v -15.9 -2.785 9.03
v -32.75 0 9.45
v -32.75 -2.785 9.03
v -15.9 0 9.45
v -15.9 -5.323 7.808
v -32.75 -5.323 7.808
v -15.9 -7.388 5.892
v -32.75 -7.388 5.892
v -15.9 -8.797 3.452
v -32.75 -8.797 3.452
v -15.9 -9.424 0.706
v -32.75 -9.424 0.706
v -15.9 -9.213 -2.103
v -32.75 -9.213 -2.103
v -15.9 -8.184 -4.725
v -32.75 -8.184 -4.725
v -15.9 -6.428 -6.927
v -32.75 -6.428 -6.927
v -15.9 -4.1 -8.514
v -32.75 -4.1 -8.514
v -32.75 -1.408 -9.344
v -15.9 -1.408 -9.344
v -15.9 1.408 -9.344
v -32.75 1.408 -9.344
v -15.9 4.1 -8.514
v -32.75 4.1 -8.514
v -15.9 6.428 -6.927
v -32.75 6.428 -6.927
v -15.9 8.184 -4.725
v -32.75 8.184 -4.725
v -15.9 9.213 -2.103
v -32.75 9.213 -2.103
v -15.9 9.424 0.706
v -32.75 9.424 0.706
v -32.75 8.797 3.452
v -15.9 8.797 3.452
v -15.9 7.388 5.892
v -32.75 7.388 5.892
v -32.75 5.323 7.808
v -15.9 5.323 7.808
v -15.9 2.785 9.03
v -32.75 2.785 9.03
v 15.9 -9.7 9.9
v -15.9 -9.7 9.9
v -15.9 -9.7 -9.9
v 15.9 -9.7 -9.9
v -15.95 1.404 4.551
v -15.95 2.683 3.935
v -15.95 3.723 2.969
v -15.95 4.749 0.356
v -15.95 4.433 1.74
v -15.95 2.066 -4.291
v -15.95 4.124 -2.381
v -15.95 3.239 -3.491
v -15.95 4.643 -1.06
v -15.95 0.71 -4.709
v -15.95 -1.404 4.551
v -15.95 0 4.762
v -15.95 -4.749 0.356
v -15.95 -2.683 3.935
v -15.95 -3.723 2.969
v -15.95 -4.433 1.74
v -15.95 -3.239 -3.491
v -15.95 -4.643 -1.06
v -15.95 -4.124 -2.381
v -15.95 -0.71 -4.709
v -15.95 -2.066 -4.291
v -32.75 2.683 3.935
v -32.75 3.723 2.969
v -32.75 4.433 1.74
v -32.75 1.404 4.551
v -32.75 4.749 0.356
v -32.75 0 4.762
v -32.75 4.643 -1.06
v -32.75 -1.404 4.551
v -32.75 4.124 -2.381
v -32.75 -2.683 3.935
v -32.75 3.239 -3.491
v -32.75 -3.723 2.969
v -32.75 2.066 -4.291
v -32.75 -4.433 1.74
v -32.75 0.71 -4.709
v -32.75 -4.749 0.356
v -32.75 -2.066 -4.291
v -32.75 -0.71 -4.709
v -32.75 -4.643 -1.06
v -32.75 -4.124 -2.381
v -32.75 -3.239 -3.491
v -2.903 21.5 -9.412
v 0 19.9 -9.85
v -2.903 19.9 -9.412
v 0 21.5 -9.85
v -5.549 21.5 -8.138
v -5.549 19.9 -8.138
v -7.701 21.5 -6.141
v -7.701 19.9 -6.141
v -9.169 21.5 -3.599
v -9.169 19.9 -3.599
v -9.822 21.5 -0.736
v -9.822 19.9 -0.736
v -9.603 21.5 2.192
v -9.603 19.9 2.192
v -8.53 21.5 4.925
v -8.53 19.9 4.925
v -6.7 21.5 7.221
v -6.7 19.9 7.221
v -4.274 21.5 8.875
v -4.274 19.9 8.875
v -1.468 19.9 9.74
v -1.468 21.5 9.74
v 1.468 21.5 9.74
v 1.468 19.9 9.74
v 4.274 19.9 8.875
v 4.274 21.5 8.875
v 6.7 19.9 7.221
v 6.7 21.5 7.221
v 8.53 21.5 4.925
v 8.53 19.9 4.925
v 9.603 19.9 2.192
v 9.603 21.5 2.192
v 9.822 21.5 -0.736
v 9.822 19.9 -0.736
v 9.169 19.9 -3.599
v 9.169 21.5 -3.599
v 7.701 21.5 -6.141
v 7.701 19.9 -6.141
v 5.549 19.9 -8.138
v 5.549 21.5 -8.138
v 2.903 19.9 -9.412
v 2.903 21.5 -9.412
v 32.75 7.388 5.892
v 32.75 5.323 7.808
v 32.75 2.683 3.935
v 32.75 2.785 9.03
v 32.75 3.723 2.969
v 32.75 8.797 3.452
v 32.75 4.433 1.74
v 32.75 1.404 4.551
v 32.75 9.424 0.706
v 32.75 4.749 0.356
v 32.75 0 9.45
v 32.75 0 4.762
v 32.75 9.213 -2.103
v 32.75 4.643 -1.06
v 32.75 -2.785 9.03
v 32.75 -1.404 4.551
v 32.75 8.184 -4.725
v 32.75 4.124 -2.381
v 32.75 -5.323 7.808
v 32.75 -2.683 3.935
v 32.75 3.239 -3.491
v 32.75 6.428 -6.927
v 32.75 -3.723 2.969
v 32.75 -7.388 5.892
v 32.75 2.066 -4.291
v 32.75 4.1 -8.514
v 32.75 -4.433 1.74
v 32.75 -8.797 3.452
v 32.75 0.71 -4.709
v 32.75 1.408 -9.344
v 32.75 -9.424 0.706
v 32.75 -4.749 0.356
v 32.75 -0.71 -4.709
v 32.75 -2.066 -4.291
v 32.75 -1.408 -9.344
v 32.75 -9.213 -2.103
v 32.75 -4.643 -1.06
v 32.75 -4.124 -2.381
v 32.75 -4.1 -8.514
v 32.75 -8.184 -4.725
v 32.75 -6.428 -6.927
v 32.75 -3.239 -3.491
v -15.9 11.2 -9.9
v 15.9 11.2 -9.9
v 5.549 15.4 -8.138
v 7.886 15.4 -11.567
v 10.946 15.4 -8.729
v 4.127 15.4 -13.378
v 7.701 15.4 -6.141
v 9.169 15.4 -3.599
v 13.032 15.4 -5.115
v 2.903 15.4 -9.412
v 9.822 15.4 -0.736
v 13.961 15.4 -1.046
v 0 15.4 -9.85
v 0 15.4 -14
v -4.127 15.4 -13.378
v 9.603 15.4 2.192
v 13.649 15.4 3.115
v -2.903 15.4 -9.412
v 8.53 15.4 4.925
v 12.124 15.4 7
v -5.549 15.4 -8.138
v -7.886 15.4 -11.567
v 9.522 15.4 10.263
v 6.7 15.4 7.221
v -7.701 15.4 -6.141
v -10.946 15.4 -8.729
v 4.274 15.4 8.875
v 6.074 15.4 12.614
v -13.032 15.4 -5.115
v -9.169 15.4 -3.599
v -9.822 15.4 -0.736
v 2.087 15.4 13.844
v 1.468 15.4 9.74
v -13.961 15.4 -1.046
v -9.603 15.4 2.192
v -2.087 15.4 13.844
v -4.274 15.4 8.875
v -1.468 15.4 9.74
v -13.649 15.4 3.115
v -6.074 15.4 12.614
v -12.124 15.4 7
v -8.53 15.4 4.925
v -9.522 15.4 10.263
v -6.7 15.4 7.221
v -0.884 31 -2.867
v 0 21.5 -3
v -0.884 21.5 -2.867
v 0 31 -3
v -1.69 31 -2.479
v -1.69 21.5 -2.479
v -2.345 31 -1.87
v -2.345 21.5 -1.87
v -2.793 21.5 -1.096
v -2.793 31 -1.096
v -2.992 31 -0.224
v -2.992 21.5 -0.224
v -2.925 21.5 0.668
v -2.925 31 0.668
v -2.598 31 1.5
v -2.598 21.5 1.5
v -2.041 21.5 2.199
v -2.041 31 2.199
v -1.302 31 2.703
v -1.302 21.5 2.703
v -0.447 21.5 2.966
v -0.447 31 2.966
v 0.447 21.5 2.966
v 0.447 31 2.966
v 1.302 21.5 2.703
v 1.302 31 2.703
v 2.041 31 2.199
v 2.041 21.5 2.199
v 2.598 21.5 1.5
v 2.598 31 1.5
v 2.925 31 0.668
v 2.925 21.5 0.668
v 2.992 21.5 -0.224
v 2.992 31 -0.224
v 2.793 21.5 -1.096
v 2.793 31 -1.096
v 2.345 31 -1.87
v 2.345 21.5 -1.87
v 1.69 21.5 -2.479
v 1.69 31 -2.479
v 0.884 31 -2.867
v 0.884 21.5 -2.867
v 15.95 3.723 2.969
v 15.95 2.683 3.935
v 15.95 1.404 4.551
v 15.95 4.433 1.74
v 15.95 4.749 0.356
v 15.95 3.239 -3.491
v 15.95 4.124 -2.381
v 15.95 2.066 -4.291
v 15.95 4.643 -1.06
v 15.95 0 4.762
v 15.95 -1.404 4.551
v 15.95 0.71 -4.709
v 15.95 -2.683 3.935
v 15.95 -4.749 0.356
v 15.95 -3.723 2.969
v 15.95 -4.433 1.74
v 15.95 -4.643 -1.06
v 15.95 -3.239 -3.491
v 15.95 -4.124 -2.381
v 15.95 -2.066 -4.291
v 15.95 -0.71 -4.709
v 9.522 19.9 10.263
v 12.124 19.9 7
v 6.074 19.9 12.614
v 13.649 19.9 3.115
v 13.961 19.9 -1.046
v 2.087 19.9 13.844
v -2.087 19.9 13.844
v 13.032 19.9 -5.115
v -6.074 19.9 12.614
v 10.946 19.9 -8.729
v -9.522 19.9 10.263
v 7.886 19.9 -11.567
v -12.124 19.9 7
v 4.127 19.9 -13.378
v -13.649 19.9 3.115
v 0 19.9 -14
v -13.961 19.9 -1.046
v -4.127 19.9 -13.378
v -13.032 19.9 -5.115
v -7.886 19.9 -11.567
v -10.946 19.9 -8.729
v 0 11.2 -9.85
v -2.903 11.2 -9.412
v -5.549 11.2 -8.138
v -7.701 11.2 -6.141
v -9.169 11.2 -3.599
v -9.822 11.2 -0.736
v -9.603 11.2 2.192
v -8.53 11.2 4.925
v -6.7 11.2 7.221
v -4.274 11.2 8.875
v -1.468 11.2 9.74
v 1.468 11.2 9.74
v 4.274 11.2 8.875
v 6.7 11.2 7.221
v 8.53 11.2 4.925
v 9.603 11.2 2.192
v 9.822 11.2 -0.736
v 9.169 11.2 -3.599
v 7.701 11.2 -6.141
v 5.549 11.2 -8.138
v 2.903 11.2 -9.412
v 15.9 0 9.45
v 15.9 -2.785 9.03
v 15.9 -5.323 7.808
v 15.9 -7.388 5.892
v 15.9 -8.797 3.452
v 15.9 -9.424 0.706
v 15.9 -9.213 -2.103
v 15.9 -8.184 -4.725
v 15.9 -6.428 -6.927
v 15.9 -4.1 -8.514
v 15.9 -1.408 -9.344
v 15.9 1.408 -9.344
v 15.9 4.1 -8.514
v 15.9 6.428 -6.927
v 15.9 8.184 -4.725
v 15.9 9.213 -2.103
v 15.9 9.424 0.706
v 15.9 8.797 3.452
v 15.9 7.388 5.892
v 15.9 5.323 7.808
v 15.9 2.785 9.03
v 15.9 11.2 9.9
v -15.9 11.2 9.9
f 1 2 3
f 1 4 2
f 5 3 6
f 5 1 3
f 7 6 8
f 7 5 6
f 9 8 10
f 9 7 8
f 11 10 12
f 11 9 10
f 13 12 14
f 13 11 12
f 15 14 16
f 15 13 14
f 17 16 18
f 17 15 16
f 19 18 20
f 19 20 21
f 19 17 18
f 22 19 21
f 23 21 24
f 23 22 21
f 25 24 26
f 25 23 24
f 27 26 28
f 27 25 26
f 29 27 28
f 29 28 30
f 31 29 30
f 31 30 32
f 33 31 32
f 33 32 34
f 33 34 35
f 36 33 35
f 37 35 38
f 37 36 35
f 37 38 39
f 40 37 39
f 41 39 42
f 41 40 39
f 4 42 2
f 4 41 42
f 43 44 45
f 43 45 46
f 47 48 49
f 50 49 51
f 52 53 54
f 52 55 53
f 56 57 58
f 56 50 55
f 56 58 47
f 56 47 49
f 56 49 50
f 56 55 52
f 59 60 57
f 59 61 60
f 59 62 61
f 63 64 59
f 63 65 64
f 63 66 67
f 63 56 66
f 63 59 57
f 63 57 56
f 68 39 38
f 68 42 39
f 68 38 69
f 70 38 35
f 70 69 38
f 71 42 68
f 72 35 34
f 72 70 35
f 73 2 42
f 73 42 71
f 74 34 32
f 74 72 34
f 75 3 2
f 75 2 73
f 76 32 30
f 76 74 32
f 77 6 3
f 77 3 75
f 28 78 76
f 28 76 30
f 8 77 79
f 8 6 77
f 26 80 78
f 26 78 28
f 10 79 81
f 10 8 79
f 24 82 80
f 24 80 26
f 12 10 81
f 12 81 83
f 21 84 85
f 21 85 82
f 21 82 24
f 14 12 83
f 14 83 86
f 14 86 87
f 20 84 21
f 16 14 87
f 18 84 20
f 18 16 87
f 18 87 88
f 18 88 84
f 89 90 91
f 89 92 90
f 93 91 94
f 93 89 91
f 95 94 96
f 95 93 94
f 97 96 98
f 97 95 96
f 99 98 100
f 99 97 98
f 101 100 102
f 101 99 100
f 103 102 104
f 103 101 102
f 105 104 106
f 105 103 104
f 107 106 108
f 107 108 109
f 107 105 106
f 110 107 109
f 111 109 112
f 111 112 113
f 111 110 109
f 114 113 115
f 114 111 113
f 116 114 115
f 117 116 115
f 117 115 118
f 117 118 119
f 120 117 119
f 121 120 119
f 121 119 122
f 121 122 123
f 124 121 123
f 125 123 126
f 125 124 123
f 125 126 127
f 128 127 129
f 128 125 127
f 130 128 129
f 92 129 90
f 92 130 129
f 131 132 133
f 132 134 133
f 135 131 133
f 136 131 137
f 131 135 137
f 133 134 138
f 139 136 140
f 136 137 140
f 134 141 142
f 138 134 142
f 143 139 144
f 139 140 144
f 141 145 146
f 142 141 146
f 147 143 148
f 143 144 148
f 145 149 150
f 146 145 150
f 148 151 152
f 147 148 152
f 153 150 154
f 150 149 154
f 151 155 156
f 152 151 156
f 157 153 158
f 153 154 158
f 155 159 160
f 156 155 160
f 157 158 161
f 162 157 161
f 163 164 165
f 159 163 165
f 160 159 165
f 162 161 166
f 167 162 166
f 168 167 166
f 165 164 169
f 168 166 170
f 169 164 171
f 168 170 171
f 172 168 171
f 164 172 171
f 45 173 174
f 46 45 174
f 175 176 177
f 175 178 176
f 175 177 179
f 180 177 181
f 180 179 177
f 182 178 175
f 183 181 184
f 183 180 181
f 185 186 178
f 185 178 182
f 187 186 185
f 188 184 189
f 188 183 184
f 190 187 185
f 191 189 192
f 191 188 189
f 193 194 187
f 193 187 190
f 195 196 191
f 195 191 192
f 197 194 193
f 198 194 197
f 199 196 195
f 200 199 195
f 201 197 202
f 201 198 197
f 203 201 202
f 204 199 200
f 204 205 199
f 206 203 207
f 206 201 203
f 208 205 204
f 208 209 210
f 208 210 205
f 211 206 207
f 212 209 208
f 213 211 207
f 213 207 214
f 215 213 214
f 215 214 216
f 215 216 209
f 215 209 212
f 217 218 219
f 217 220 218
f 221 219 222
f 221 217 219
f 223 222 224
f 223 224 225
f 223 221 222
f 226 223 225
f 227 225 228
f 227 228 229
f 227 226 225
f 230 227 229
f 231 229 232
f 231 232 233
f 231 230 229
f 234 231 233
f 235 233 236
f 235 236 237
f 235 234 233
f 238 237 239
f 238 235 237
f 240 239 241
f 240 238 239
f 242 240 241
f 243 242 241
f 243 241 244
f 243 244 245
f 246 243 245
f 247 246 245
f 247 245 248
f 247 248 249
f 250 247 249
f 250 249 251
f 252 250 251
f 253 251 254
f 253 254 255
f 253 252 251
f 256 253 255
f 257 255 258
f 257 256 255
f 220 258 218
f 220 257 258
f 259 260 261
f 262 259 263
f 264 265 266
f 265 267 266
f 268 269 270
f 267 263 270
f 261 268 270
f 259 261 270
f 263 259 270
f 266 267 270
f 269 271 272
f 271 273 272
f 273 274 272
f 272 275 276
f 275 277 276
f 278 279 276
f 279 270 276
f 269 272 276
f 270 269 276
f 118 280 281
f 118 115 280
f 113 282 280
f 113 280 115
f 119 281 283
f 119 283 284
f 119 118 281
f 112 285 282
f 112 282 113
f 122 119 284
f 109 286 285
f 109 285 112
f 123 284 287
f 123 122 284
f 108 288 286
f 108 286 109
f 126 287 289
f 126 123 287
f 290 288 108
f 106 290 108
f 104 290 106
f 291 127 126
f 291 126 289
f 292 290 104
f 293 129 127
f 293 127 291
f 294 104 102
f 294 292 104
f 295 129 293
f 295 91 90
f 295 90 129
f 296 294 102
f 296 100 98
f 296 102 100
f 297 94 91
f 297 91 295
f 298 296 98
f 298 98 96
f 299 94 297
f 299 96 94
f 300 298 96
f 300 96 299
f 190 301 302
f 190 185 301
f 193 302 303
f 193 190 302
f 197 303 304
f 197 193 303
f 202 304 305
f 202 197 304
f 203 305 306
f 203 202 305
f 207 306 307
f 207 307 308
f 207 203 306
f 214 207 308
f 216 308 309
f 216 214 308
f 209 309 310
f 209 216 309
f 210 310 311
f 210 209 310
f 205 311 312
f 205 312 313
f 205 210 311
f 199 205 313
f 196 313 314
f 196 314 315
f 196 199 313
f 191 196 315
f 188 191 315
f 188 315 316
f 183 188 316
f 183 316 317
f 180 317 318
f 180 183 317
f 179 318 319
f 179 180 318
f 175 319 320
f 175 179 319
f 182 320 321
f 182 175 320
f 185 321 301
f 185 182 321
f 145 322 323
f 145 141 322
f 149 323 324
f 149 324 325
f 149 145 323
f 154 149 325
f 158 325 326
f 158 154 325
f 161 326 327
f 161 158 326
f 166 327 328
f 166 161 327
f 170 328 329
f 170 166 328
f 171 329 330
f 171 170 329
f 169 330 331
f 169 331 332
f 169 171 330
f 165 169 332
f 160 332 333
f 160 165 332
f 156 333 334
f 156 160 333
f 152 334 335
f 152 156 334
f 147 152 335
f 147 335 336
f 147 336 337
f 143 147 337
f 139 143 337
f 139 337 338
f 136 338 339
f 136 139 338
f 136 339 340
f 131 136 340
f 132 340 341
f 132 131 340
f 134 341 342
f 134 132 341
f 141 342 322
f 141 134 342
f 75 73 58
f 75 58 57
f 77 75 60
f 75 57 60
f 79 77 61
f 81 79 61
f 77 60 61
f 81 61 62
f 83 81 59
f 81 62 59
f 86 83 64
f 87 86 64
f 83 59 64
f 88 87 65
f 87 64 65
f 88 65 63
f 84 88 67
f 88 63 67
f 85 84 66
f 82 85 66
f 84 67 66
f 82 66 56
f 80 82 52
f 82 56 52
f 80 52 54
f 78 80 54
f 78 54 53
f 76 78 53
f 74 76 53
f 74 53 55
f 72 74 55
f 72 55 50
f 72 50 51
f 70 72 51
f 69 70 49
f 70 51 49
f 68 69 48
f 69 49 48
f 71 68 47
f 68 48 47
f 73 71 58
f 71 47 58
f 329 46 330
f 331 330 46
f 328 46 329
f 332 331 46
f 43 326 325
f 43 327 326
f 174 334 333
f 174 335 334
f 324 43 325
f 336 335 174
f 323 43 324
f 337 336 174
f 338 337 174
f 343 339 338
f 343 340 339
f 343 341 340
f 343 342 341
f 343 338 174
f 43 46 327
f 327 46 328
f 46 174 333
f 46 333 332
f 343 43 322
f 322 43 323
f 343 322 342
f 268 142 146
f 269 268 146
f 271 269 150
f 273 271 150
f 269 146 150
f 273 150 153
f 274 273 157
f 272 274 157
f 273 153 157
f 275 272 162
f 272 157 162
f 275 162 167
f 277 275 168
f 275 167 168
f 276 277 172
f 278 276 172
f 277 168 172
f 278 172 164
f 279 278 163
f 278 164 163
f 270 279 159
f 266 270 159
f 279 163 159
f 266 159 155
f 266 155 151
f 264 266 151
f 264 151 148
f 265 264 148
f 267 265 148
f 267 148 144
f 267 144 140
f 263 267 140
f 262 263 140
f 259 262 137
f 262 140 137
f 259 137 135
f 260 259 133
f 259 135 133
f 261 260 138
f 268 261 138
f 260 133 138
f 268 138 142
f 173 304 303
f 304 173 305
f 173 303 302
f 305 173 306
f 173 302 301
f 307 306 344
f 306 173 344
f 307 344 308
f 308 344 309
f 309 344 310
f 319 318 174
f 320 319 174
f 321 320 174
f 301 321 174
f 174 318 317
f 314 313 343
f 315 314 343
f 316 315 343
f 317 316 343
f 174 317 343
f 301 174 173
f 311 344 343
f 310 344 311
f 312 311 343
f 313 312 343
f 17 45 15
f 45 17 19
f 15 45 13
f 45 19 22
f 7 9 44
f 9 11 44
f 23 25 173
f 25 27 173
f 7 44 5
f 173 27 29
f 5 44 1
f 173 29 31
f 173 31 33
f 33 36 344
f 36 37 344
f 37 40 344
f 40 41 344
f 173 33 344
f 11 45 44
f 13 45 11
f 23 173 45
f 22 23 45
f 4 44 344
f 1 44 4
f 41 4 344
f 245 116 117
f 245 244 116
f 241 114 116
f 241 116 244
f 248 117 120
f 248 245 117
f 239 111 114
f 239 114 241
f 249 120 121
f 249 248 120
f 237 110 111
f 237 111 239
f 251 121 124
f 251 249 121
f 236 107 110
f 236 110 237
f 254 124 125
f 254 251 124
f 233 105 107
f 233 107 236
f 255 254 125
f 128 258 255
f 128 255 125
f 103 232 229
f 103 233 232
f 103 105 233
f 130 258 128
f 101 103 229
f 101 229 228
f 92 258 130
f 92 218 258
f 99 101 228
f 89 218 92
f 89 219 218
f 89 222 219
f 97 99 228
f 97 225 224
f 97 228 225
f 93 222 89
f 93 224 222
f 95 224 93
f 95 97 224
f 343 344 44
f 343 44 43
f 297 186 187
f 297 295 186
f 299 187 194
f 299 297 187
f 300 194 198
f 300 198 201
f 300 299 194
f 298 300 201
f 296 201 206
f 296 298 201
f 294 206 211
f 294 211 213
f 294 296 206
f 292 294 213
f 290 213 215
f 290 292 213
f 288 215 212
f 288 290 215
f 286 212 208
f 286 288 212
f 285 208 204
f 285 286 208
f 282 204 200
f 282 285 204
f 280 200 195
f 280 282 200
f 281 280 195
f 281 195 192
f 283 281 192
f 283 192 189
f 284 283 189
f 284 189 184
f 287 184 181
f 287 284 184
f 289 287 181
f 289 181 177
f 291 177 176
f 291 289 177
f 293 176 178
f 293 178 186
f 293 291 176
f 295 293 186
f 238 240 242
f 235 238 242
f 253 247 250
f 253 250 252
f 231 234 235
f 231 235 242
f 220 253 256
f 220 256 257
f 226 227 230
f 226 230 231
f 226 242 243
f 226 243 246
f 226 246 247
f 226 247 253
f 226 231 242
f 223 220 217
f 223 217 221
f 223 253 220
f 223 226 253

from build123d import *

# Parameters (mm, degrees)
BODY_SKETCH_W       = 31.8
BODY_SKETCH_H       = 20.9
BODY_DEPTH          = 9.9
NUT_X_SKETCH_W      = 16.85
NUT_X_SKETCH_H      = 9.45
NUT_X_SKETCH_2_W    = 16.85
NUT_X_SKETCH_2_H    = 9.45
SOCKET_X_SKETCH_W   = 17.8
SOCKET_X_SKETCH_H   = 4.7625
SOCKET_X_SKETCH_2_W = 17.8
SOCKET_X_SKETCH_2_H = 4.7625


with BuildPart() as part:
    # Body Sketch → Body (new, symmetric)
    with BuildSketch(Plane.XY):
        with Locations((0, 0.75)):
            Rectangle(BODY_SKETCH_W, BODY_SKETCH_H)
    extrude(amount=BODY_DEPTH, both=True)

    # Nut _X Sketch → Nut _X (revolve)
    with BuildSketch(Plane.XY):
        with Locations((24.325, 4.725)):
            Rectangle(NUT_X_SKETCH_W, NUT_X_SKETCH_H)
    revolve(axis=Axis((-1000, 0, 0), (1, 0, 0)))

    # Nut -X Sketch 2 → Nut -X 2 (revolve)
    with BuildSketch(Plane.XY):
        with Locations((-24.325, 4.725)):
            Rectangle(NUT_X_SKETCH_2_W, NUT_X_SKETCH_2_H)
    revolve(axis=Axis((-1000, 0, 0), (1, 0, 0)))

    # Socket _X Sketch → Socket _X (revolve, cut)
    with BuildSketch(Plane.XY):
        with Locations((24.85, 2.38125)):
            Rectangle(SOCKET_X_SKETCH_W, SOCKET_X_SKETCH_H)
    revolve(axis=Axis((-1000, 0, 0), (1, 0, 0)), mode=Mode.SUBTRACT)

    # Socket -X Sketch 2 → Socket -X 2 (revolve, cut)
    with BuildSketch(Plane.XY):
        with Locations((-24.85, 2.38125)):
            Rectangle(SOCKET_X_SKETCH_2_W, SOCKET_X_SKETCH_2_H)
    revolve(axis=Axis((-1000, 0, 0), (1, 0, 0)), mode=Mode.SUBTRACT)

    # Stem Sketch → Stem (revolve)
    with BuildSketch(Plane.XY):
        Polygon((0, 11.2), (9.85, 11.2), (9.85, 15.4), (14, 15.4), (14, 19.9), (9.85, 19.9), (9.85, 21.5), (3, 21.5), (3, 31), (0, 31), align=None)
    revolve(axis=Axis((0, -500, 0), (0, 1, 0)))


solid = part.part
